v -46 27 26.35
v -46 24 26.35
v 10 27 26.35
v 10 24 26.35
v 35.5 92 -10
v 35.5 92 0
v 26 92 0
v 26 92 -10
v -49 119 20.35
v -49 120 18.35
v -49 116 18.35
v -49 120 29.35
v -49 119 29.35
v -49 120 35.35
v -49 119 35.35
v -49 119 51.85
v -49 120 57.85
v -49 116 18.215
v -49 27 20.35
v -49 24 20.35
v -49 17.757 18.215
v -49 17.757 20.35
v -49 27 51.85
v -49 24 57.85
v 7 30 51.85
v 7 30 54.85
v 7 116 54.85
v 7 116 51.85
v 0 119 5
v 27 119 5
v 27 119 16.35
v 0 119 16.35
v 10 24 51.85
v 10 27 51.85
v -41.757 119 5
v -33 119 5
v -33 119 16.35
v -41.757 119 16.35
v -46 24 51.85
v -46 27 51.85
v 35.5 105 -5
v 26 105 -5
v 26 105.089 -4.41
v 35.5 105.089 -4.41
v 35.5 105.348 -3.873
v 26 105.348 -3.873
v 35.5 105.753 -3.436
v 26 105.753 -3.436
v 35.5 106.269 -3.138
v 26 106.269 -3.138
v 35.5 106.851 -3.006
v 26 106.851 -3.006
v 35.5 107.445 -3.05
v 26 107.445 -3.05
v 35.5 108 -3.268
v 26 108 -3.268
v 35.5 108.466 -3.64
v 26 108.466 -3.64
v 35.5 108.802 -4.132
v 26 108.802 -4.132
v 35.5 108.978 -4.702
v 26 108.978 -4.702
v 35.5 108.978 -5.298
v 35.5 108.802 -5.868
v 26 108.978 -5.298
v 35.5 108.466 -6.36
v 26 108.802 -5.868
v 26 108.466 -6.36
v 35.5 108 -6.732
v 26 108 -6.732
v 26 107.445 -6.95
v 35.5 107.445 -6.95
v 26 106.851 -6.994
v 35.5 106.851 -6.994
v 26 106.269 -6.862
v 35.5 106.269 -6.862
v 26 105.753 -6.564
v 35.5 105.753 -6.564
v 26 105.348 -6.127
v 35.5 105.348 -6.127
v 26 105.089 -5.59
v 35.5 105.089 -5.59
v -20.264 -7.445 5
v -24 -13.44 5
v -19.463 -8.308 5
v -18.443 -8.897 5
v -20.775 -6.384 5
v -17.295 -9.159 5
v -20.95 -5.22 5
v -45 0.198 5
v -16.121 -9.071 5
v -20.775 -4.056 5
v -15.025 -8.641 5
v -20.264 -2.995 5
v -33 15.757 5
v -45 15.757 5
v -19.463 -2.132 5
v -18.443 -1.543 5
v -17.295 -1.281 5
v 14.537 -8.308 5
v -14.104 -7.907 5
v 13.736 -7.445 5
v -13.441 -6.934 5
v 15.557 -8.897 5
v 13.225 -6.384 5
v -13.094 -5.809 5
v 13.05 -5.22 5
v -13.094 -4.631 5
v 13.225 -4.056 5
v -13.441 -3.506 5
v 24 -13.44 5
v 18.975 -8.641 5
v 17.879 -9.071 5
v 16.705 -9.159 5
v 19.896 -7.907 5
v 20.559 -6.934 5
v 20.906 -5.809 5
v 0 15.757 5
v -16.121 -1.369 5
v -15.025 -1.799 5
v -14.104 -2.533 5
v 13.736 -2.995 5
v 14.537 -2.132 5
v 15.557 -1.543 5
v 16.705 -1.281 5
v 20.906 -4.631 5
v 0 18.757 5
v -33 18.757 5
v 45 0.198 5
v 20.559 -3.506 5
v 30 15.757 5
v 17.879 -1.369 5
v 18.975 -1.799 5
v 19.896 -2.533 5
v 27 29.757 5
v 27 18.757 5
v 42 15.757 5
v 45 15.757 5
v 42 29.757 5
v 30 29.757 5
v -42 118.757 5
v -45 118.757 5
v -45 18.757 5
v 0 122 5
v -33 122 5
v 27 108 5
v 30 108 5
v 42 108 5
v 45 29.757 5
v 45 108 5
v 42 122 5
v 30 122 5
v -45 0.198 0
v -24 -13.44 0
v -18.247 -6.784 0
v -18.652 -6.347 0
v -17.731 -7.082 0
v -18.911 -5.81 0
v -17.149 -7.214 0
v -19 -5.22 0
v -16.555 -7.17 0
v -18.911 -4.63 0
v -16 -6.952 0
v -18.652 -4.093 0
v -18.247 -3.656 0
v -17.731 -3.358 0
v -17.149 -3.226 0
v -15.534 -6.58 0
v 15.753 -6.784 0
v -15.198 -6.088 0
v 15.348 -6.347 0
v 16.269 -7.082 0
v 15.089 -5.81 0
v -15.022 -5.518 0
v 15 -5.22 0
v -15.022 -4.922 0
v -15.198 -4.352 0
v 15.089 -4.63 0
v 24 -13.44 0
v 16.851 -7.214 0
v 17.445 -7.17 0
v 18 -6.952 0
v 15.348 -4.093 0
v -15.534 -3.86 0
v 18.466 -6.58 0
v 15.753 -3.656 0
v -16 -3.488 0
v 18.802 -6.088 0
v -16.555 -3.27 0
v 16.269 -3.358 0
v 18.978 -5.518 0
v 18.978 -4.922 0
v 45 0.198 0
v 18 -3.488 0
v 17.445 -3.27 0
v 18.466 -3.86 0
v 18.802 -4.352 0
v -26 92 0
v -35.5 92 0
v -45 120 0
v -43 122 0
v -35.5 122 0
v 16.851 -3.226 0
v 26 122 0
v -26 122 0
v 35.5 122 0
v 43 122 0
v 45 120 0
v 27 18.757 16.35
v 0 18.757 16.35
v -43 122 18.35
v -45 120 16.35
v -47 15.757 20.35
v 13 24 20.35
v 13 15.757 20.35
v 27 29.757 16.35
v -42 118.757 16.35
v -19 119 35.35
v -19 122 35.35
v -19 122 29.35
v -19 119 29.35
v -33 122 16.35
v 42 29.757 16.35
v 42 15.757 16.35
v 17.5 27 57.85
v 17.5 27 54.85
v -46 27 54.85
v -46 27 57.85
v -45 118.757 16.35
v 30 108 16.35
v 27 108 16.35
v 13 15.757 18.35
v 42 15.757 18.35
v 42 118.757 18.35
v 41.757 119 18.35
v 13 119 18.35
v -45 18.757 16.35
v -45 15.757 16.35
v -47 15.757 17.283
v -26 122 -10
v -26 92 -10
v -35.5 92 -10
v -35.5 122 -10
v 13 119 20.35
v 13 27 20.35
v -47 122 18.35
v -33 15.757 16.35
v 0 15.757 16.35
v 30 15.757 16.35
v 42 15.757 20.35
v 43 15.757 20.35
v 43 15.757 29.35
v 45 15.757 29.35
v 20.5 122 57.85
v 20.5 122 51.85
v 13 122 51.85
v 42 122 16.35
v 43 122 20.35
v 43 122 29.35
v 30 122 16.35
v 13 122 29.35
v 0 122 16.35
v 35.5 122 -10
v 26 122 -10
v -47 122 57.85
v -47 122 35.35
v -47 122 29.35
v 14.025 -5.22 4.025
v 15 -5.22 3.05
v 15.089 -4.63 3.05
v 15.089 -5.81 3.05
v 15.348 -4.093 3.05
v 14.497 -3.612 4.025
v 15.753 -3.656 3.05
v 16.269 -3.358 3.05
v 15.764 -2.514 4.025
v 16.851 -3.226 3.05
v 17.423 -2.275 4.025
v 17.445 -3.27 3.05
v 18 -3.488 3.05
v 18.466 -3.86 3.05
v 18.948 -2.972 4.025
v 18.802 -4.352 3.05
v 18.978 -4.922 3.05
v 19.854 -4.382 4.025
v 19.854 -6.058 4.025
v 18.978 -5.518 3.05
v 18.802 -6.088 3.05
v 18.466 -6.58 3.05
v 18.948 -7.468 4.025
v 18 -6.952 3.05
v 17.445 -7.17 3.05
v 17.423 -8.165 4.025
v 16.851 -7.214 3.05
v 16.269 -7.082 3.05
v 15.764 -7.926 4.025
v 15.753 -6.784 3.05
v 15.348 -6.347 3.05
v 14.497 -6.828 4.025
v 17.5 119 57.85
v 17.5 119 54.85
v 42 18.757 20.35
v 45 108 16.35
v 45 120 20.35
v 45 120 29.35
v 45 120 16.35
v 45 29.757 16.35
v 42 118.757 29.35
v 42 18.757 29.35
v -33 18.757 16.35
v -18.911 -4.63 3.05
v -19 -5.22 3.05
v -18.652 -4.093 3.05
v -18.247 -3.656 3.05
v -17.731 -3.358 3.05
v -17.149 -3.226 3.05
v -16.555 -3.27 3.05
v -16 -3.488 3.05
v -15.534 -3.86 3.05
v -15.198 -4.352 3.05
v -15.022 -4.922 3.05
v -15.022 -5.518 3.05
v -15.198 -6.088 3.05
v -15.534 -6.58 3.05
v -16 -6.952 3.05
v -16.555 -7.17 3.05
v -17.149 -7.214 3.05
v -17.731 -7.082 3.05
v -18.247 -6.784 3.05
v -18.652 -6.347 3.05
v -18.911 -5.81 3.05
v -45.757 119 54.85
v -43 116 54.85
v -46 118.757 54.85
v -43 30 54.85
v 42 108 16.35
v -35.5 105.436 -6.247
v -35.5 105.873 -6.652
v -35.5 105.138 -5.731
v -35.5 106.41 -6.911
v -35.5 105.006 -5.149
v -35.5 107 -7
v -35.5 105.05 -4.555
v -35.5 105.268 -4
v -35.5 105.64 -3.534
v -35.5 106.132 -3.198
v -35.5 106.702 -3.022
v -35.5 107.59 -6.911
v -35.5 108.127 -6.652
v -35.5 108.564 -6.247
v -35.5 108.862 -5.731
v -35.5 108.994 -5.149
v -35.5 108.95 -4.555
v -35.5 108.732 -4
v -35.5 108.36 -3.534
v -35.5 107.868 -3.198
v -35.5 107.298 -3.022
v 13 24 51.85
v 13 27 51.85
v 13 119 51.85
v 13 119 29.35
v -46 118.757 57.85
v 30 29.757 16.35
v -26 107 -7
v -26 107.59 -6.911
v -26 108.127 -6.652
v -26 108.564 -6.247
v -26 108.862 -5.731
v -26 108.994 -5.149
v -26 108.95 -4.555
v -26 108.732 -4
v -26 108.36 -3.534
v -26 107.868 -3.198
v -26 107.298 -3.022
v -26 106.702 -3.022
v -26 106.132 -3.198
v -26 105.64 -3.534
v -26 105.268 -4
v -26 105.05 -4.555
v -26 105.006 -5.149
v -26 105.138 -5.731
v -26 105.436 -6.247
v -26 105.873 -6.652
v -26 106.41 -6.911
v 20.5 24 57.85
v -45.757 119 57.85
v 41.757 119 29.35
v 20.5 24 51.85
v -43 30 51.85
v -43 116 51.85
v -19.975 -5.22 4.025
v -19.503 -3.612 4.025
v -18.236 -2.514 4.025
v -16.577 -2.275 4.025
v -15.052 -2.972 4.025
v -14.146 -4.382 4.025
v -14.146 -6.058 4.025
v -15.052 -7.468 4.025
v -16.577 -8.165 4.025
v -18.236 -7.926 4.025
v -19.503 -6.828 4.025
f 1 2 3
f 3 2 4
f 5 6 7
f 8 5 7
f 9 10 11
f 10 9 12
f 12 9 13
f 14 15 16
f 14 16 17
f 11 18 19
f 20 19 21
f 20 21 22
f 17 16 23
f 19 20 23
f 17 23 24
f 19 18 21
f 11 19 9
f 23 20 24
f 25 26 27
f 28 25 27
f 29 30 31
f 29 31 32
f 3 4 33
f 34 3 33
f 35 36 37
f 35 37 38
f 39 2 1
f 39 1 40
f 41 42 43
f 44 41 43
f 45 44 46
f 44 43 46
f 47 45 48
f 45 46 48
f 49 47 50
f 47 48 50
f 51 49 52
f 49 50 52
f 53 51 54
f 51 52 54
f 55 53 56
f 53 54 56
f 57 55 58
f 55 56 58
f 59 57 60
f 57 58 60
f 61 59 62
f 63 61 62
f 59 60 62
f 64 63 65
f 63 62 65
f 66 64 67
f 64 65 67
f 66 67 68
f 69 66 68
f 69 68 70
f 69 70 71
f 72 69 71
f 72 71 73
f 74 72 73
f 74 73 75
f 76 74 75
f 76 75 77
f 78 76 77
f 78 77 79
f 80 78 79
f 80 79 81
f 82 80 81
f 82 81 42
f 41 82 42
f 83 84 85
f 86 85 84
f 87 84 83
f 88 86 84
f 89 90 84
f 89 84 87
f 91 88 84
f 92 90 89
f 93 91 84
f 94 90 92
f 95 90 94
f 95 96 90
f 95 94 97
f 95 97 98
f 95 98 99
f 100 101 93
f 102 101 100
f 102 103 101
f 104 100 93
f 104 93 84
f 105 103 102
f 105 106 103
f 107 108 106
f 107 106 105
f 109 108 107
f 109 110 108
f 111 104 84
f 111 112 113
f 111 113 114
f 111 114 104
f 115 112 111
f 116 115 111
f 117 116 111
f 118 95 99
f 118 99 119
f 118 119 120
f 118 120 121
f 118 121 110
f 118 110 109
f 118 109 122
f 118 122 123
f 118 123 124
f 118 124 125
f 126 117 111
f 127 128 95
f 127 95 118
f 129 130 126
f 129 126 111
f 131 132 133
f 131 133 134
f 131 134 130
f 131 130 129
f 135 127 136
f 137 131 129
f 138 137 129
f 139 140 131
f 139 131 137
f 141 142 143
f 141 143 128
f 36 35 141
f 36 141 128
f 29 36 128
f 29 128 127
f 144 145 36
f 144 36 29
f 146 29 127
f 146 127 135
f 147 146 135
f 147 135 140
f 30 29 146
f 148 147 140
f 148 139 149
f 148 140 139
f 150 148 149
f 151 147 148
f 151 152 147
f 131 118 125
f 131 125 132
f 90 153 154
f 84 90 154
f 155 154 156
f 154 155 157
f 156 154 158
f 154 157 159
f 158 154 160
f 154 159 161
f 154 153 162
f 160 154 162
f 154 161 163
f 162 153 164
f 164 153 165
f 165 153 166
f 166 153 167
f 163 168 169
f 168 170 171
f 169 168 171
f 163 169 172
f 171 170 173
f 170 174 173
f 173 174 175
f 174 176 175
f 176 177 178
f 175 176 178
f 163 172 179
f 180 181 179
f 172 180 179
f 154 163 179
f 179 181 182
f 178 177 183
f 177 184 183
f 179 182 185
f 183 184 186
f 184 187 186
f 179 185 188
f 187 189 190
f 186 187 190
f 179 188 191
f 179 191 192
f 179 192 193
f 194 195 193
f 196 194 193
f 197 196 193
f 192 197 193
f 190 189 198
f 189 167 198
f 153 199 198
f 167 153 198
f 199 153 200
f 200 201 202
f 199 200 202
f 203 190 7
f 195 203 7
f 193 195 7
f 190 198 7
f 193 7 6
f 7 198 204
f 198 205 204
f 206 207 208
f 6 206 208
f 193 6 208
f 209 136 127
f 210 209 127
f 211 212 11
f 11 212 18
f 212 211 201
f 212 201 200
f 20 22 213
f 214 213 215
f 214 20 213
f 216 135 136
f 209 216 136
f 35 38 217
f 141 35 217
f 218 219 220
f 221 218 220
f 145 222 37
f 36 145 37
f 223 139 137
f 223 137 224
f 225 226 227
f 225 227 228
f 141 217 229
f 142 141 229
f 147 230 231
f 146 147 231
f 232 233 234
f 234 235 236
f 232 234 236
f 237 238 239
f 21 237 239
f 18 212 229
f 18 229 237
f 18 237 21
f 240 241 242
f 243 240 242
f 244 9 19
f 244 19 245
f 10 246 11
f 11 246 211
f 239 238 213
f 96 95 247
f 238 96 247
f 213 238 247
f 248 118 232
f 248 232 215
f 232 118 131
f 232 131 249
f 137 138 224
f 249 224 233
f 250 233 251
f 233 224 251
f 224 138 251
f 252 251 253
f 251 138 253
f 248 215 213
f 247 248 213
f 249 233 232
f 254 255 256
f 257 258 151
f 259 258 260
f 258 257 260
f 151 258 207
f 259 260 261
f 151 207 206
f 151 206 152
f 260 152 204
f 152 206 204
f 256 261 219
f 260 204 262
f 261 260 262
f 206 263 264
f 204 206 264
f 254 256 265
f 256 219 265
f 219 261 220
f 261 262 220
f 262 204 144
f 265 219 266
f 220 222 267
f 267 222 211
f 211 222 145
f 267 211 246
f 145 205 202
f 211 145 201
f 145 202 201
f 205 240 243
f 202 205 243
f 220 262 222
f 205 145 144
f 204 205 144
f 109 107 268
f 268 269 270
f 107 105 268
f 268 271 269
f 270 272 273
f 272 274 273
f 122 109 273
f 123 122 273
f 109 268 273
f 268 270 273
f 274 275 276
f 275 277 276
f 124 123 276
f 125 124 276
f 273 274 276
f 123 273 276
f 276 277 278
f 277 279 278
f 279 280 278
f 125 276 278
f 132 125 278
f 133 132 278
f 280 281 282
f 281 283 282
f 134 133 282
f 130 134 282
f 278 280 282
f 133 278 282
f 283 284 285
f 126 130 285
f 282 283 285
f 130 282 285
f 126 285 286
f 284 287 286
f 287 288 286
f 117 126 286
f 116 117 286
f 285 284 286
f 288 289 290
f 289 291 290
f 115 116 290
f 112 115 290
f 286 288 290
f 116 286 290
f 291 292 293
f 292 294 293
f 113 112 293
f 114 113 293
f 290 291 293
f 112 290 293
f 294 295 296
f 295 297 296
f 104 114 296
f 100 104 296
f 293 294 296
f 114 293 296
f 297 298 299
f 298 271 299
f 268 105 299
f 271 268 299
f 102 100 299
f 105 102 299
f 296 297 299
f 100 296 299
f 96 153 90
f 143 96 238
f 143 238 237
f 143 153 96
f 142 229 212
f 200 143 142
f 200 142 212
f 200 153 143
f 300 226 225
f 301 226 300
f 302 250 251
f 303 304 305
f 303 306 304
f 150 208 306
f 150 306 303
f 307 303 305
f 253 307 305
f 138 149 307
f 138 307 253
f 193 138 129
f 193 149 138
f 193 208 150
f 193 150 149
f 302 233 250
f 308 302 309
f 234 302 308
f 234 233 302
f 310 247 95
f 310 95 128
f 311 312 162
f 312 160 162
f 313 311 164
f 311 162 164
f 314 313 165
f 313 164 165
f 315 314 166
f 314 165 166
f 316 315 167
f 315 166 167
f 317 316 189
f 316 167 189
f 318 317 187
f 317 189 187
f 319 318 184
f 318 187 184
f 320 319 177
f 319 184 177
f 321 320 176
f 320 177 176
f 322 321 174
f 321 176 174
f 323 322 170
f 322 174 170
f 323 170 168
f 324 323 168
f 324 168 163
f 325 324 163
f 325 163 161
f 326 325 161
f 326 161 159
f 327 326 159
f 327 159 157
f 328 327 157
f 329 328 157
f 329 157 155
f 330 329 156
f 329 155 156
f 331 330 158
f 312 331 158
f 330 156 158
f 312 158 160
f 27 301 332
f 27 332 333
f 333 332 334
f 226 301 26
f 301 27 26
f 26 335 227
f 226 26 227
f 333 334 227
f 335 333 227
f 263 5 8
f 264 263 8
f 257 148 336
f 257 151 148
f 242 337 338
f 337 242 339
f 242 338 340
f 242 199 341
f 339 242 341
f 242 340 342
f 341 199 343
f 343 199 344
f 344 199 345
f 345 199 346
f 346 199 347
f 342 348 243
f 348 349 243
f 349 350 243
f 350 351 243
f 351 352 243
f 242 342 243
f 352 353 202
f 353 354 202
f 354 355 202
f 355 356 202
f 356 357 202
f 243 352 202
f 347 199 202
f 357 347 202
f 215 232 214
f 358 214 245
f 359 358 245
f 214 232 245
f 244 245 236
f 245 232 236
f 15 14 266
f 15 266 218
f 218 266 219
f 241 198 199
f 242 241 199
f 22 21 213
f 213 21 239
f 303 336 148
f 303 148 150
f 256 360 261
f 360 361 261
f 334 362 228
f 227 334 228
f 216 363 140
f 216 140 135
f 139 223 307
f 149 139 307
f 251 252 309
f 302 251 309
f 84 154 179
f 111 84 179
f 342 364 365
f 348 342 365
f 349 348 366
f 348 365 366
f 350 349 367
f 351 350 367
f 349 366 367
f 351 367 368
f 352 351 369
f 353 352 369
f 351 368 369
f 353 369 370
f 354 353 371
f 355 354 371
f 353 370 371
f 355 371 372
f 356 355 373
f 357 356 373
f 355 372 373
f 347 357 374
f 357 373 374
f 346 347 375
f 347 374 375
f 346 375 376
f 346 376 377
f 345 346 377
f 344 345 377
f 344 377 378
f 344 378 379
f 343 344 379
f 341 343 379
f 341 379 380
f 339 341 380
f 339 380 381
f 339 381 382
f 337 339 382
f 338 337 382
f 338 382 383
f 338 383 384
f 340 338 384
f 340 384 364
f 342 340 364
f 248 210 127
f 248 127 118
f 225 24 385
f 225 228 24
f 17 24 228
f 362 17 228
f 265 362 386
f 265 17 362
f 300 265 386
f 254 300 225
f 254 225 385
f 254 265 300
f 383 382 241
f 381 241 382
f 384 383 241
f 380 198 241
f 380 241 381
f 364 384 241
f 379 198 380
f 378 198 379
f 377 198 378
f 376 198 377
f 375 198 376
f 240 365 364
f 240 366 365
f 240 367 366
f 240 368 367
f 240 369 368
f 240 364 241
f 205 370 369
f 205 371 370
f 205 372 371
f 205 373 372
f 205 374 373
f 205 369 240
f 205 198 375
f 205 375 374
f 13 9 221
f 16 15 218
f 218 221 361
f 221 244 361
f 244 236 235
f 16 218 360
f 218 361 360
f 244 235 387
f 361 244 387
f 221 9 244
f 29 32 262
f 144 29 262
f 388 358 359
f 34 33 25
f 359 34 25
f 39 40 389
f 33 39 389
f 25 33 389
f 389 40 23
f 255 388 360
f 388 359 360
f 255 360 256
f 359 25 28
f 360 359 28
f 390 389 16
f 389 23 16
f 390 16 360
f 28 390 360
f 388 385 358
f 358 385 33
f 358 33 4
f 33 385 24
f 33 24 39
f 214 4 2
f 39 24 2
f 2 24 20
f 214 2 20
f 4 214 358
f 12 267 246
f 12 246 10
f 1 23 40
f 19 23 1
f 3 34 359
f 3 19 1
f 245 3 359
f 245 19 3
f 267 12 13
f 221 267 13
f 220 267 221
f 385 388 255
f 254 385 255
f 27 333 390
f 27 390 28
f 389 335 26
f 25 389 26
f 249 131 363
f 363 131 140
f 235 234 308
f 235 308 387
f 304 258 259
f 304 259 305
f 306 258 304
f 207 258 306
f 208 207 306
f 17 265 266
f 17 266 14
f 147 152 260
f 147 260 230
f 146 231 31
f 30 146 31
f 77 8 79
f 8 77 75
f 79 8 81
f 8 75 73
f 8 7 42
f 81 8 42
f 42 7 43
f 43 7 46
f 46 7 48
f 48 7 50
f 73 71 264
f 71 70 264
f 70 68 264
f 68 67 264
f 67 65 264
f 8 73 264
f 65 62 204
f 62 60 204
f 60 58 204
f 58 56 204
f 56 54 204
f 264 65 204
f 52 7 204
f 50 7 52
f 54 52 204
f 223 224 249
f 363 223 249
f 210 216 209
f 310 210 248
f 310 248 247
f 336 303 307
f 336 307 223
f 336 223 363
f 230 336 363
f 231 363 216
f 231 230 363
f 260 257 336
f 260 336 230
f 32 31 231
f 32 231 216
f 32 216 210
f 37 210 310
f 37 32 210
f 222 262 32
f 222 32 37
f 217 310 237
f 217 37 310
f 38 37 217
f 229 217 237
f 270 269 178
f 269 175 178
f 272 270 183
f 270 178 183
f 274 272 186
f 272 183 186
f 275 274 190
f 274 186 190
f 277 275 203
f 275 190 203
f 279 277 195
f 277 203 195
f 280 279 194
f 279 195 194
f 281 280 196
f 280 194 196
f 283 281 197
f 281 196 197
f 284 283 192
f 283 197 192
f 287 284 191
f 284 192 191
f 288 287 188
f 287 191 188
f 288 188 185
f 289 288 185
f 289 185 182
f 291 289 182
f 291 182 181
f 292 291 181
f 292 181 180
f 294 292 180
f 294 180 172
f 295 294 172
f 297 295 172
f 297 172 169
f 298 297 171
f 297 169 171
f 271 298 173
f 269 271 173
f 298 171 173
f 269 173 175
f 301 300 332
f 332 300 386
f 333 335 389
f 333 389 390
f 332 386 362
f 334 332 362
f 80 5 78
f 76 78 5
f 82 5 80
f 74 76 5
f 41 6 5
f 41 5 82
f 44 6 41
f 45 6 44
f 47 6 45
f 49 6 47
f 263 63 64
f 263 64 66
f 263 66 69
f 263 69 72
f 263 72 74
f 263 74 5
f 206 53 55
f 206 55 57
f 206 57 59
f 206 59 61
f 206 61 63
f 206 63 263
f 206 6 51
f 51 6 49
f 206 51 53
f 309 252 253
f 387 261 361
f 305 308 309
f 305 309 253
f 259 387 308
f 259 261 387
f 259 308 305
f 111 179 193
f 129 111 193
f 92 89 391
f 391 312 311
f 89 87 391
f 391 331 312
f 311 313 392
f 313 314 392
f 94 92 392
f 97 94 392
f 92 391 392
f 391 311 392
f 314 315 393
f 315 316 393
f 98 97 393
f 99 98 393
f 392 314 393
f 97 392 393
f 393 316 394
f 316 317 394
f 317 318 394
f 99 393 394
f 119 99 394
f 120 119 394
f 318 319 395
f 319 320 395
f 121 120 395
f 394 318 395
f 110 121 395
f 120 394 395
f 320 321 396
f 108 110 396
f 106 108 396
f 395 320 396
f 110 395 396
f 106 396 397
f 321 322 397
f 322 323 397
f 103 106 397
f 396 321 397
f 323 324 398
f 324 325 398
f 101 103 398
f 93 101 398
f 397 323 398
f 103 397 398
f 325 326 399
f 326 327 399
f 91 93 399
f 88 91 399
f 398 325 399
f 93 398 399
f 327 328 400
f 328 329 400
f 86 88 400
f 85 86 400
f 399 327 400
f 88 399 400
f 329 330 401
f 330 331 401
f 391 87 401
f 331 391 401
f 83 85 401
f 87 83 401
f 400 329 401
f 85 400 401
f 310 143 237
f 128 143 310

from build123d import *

# Parameters (mm, degrees)
BOSS_EXTRUDE1_DEPTH           = 5
CHAMFER1_SIZE                 = 2
SKETCH4_W                     = 12
SKETCH4_H                     = 3
BOSS_EXTRUDE2_DEPTH           = 11.35
BOSS_EXTRUDE3_DEPTH           = 4
BOSS_EXTRUDE4_DEPTH           = 11.35
CHAMFER2_START                = 116.672618896
CHAMFER2_OUTLINE_W            = 5
CHAMFER2_OUTLINE_H            = 5.65
CHAMFER2_DEPTH                = 2.327381104
CUT_EXTRUDE2_DEPTH            = 2
BOSS_EXTRUDE5_DEPTH           = 9
BOSS_EXTRUDE6_DEPTH           = 12
SKETCH11_W                    = 3
SKETCH11_H                    = 100.242640687
BOSS_EXTRUDE7_DEPTH           = 9
CHAMFER3_SIZE                 = 2
SKETCH12_W                    = 21
SKETCH12_H                    = 5
CUT_EXTRUDE3_DEPTH            = 9
CHAMFER5_SIZE                 = 4.996701125
CHAMFER5_SIZE_2               = 2.33
SKETCH13_W                    = 12
SKETCH13_H                    = 11.35
CUT_EXTRUDE4_DEPTH            = 117
SKETCH14_W                    = 3
SKETCH14_H                    = 11.35
BOSS_EXTRUDE8_DEPTH           = 7
BOSS_EXTRUDE9_START           = 85.242641
SKETCH14_2_W                  = 3
SKETCH14_2_H                  = 11.35
BOSS_EXTRUDE9_DEPTH           = 8
SKETCH15_W                    = 9
SKETCH15_H                    = 92
CUT_EXTRUDE5_DEPTH            = 10
BOSS_EXTRUDE10_START          = -9
SKETCH16_W                    = 62
SKETCH16_H                    = 3
BOSS_EXTRUDE10_DEPTH          = 31.5
BOSS_EXTRUDE12_DEPTH          = 6
SKETCH18_W                    = 50
SKETCH18_H                    = 86
CUT_EXTRUDE6_DEPTH            = 6
CUT_EXTRUDE7_DEPTH            = 3
SKETCH20_W                    = 6
SKETCH20_H                    = 98
CUT_EXTRUDE8_DEPTH            = 3
BOSS_EXTRUDE13_DEPTH          = 10.5
SKETCH22_W                    = 3
SKETCH22_H                    = 92
BOSS_EXTRUDE14_DEPTH          = 3
CUT_EXTRUDE9_START            = -2
CUT_EXTRUDE9_DEPTH            = 10
CUT_EXTRUDE10_DEPTH           = 9
SKETCH25_W                    = 9.5
SKETCH25_H                    = 30
BOSS_EXTRUDE15_DEPTH          = 10
CSK_FOR_M4_SFHCS2_D           = 4
CSK_FOR_M4_SFHCS2_DEPTH       = 13
CSK_FOR_M4_SFHCS2_CSINK_D     = 7.9
CSK_FOR_M4_SFHCS2_CSINK_ANGLE = 90
CSK_FOR_M4_SFHCS2_TIP         = 1.201721238
CHAMFER6_SIZE                 = 2
CHAMFER6_SIZE_2               = 4.289013841
SKETCH30_W                    = 56
SKETCH30_H                    = 25.5
CUT_EXTRUDE11_DEPTH           = 18.5
SKETCH32_W                    = 30
SKETCH32_H                    = 6
CUT_EXTRUDE13_DEPTH           = 10
CSK_FOR_M4_SFHCS3_D           = 4
CSK_FOR_M4_SFHCS3_DEPTH       = 19
CSK_FOR_M4_SFHCS3_CSINK_D     = 7.9
CSK_FOR_M4_SFHCS3_CSINK_ANGLE = 90
CSK_FOR_M4_SFHCS3_TIP         = 1.201721238
F_4_0MM_DOWEL_HOLE1_D         = 4


with BuildPart() as part:
    # Sketch2 → Boss-Extrude1 (new body)
    with BuildSketch(Plane.XY):
        Polygon((-45, 122), (-45, 0.197559457), (-24, -13.44), (24, -13.44), (45, 0.197559457), (45, 122), align=None)
    extrude(amount=BOSS_EXTRUDE1_DEPTH)

    # Chamfer1
    chamfer1_edges = [part.edges().sort_by_distance(p)[0] for p in [
        (45, 122, 2.5),
        (-45, 122, 2.5),
    ]]
    chamfer(chamfer1_edges, length=CHAMFER1_SIZE)

    # Sketch4 → Boss-Extrude2 (add)
    with BuildSketch(Plane.XY.offset(5)):
        Polygon((-45, 120), (-43, 122), (-33, 122), (-33, 119), (-41.757359313, 119), (-42, 118.757359313), (-45, 118.757359313), align=None)
        with Locations((-39, 17.257359313)):
            Rectangle(SKETCH4_W, SKETCH4_H)
        Polygon((0, 122), (30, 122), (30, 108), (27, 108), (27, 119), (0, 119), align=None)
        Polygon((0, 15.757359313), (30, 15.757359313), (30, 29.757359313), (27, 29.757359313), (27, 18.757359313), (0, 18.757359313), align=None)
    extrude(amount=BOSS_EXTRUDE2_DEPTH)

    # Sketch5 → Boss-Extrude3 (add)
    with BuildSketch(Plane.XY.offset(16.35)):
        Polygon((45, 15.757359313), (-45, 15.757359313), (-45, 120), (-43, 122), (45, 122), align=None)
    extrude(amount=BOSS_EXTRUDE3_DEPTH)

    # Sketch6 → Boss-Extrude4 (add)
    with BuildSketch(Plane.XY.offset(5)):
        Polygon((38, 122), (43, 122), (45, 120), (45, 115), (42, 115), (42, 118.757359313), (41.757359313, 119), (38, 119), align=None)
        Polygon((45, 15.757359313), (39, 15.757359313), (39, 18.757359313), (42, 18.757359313), (42, 21.757359313), (45, 21.757359313), align=None)
    extrude(amount=BOSS_EXTRUDE4_DEPTH)

    # Chamfer2: read off the stored shape, not the designer's step
    # Chamfer2 outline → Chamfer2 (cut)
    with BuildSketch(Plane(origin=(0, 0, 0), x_dir=(0.7071067811865474, -0.7071067811865477, 0), z_dir=(0.7071067811865476, 0.7071067811865476, 0)).offset(CHAMFER2_START)):
        with Locations((-54.5, -19.175)):
            Rectangle(CHAMFER2_OUTLINE_W, CHAMFER2_OUTLINE_H)
    extrude(amount=CHAMFER2_DEPTH, mode=Mode.SUBTRACT)

    # Sketch8 → Cut-Extrude2 (cut)
    with BuildSketch(Plane.XY.offset(20.35)):
        Polygon((-45, 15.757359313), (-37, 15.757359313), (-37, 122), (-43, 122), (-45, 120), align=None)
    extrude(amount=-CUT_EXTRUDE2_DEPTH, mode=Mode.SUBTRACT)

    # Sketch9 → Boss-Extrude5 (add)
    with BuildSketch(Plane.XY.offset(20.35)):
        Polygon((-37, 18.757359313), (42, 18.757359313), (42, 118.757359313), (41.757359313, 119), (-37, 119), (-37, 122), (43, 122), (45, 120), (45, 15.757359313), (-37, 15.757359313), align=None)
    extrude(amount=BOSS_EXTRUDE5_DEPTH)

    # Sketch10 → Boss-Extrude6 (add)
    with BuildSketch(Plane.ZY.offset(37)):
        Polygon((18.35, 15.757359313), (29.35, 15.757359313), (29.35, 18.757359313), (20.35, 18.757359313), (20.35, 119), (29.35, 119), (29.35, 122), (18.35, 122), align=None)
    extrude(amount=BOSS_EXTRUDE6_DEPTH)

    # Sketch11 → Boss-Extrude7 (add)
    with BuildSketch(Plane.XY.offset(20.35)):
        with Locations((-47.5, 68.878679657)):
            Rectangle(SKETCH11_W, SKETCH11_H)
    extrude(amount=BOSS_EXTRUDE7_DEPTH)

    # Chamfer3
    chamfer3_edges = [part.edges().sort_by_distance(p)[0] for p in [
        (-49, 15.757359313, 23.85),
        (-49, 122, 23.85),
    ]]
    chamfer(chamfer3_edges, length=CHAMFER3_SIZE)

    # Sketch12 → Cut-Extrude3 (cut)
    with BuildSketch(Plane(origin=(0, 18.757359313, 0), x_dir=(1, 0, 0), z_dir=(0, 1, 0))):
        with Locations((27.5, -22.85)):
            Rectangle(SKETCH12_W, SKETCH12_H)
    extrude(amount=-CUT_EXTRUDE3_DEPTH, mode=Mode.SUBTRACT)

    # Chamfer5
    # the kernel refuses this chamfer: 4.996701125, 2.33 mm, written as the material it takes off along each edge
    with BuildSketch(Plane(origin=(38, 18.757359313, 20.35), x_dir=(1, 0, 0), z_dir=(0, 0, 1))) as chamfer5_piece_1_section:
        Polygon((CHAMFER5_SIZE, 0), (0, -CHAMFER5_SIZE_2), (0, 0), align=None)
    chamfer5_piece_1 = extrude(amount=5, mode=Mode.PRIVATE)
    chamfer5_piece_1 = split(chamfer5_piece_1, bisect_by=Plane(origin=(42, 18.757359313, 20.35), z_dir=(-1, 0, 0)), keep=Keep.TOP, mode=Mode.PRIVATE)
    add(chamfer5_piece_1, mode=Mode.SUBTRACT)
    with BuildSketch(Plane(origin=(17, 18.757359313, 25.35), x_dir=(-1, 0, 0), z_dir=(0, 0, -1))) as chamfer5_piece_2:
        Polygon((CHAMFER5_SIZE, 0), (0, -CHAMFER5_SIZE_2), (0, 0), align=None)
    extrude(amount=5, mode=Mode.SUBTRACT)

    # Sketch13 → Cut-Extrude4 (cut)
    with BuildSketch(Plane(origin=(0, 122, 0), x_dir=(1, 0, 0), z_dir=(0, 1, 0))):
        with Locations((36, -10.675)):
            Rectangle(SKETCH13_W, SKETCH13_H)
    extrude(amount=-CUT_EXTRUDE4_DEPTH, mode=Mode.SUBTRACT)

    # Sketch14 → Boss-Extrude8 (add)
    with BuildSketch(Plane.XZ.offset(-115)):
        with Locations((43.5, 10.675)):
            Rectangle(SKETCH14_W, SKETCH14_H)
    extrude(amount=BOSS_EXTRUDE8_DEPTH)

    # Sketch14<2> → Boss-Extrude9 (add)
    with BuildSketch(Plane.XZ.offset(-115).offset(BOSS_EXTRUDE9_START)):
        with Locations((43.5, 10.675)):
            Rectangle(SKETCH14_2_W, SKETCH14_2_H)
    extrude(amount=BOSS_EXTRUDE9_DEPTH)

    # Sketch15 → Cut-Extrude5 (cut)
    with BuildSketch(Plane.ZY.offset(49)):
        with Locations((24.85, 73)):
            Rectangle(SKETCH15_W, SKETCH15_H)
    extrude(amount=-CUT_EXTRUDE5_DEPTH, mode=Mode.SUBTRACT)

    # Sketch16 → Boss-Extrude10 (add)
    with BuildSketch(Plane.XY.offset(29.35).offset(BOSS_EXTRUDE10_START)):
        Polygon((13, 122), (13, 119), (-49, 119), (-49, 120), (-47, 122), align=None)
        with Locations((-18, 25.5)):
            Rectangle(SKETCH16_W, SKETCH16_H)
    extrude(amount=BOSS_EXTRUDE10_DEPTH)

    # Sketch17 → Boss-Extrude12 (add)
    with BuildSketch(Plane.XY.offset(51.85)):
        Polygon((-49, 119), (-49, 27), (-49, 24), (13, 24), (13, 27), (13, 119), (13, 122), (-47, 122), (-49, 120), align=None)
    extrude(amount=BOSS_EXTRUDE12_DEPTH)

    # Sketch18 → Cut-Extrude6 (cut)
    with BuildSketch(Plane.XY.offset(57.85)):
        with Locations((-18, 73)):
            Rectangle(SKETCH18_W, SKETCH18_H)
    extrude(amount=-CUT_EXTRUDE6_DEPTH, mode=Mode.SUBTRACT)

    # Sketch19 → Cut-Extrude7 (cut)
    with BuildSketch(Plane.XY.offset(57.85)):
        Polygon((10, 119), (-45.757359313, 119), (-46, 118.757359313), (-46, 27), (10, 27), align=None)
    extrude(amount=-CUT_EXTRUDE7_DEPTH, mode=Mode.SUBTRACT)

    # Sketch20 → Cut-Extrude8 (cut)
    with BuildSketch(Plane(origin=(13, 0, 0), x_dir=(0, 0, -1), z_dir=(1, 0, 0))):
        with Locations((-54.85, 73)):
            Rectangle(SKETCH20_W, SKETCH20_H)
    extrude(amount=-CUT_EXTRUDE8_DEPTH, mode=Mode.SUBTRACT)

    # Sketch21 → Boss-Extrude13 (add)
    with BuildSketch(Plane(origin=(10, 0, 0), x_dir=(0, 0, -1), z_dir=(1, 0, 0))):
        Polygon((-57.85, 27), (-57.85, 24), (-51.85, 24), (-51.85, 27), (-51.85, 119), (-51.85, 122), (-57.85, 122), (-57.85, 119), (-54.85, 119), (-54.85, 27), align=None)
    extrude(amount=BOSS_EXTRUDE13_DEPTH)

    # Sketch22 → Boss-Extrude14 (add)
    with BuildSketch(Plane.XY.offset(54.85)):
        with Locations((19, 73)):
            Rectangle(SKETCH22_W, SKETCH22_H)
    extrude(amount=BOSS_EXTRUDE14_DEPTH)

    # Sketch23 → Cut-Extrude9 (cut)
    with BuildSketch(Plane.XY.offset(20.35).offset(CUT_EXTRUDE9_START)):
        Polygon((13, 15.757359313), (13, 119), (41.757359313, 119), (42, 118.757359313), (42, 15.757359313), align=None)
    extrude(amount=CUT_EXTRUDE9_DEPTH, mode=Mode.SUBTRACT)

    # Sketch24 → Cut-Extrude10 (cut)
    with BuildSketch(Plane.XY.offset(29.35)):
        Polygon((43, 15.757359313), (42, 18.757359313), (-46, 18.757359313), (-46, 24), (-49, 24), (-49, 17.757359313), (-47, 15.757359313), align=None)
    extrude(amount=-CUT_EXTRUDE10_DEPTH, mode=Mode.SUBTRACT)

    # Sketch25 → Boss-Extrude15 (add)
    with BuildSketch(Plane(origin=(0, 0, 0), x_dir=(-1, 0, 0), z_dir=(0, 0, -1))):
        with Locations((30.75, 107)):
            Rectangle(SKETCH25_W, SKETCH25_H)
        with Locations((-30.75, 107)):
            Rectangle(SKETCH25_W, SKETCH25_H)
    extrude(amount=BOSS_EXTRUDE15_DEPTH)

    # CSK for M4 SFHCS2
    with Locations(Plane(origin=(-695.683007616, 1385.247292614, 5), x_dir=(1, 0, 0), z_dir=(0, 0, 1))):
        with Locations((678.683007616, -1390.467292614), (712.683007616, -1390.467292614)):
            CounterSinkHole(CSK_FOR_M4_SFHCS2_D / 2, CSK_FOR_M4_SFHCS2_CSINK_D / 2, depth=CSK_FOR_M4_SFHCS2_DEPTH, counter_sink_angle=CSK_FOR_M4_SFHCS2_CSINK_ANGLE)
            with Locations((0, 0, -(CSK_FOR_M4_SFHCS2_DEPTH + CSK_FOR_M4_SFHCS2_TIP / 2))):  # 118° drill point
                Cone(0, CSK_FOR_M4_SFHCS2_D / 2, CSK_FOR_M4_SFHCS2_TIP, mode=Mode.SUBTRACT)

    # Chamfer6
    # the kernel refuses this chamfer: 4.289013841, 2 mm, written as the material it adds along each edge
    with BuildSketch(Plane(origin=(-45, 131.112729659, 18.35), x_dir=(0, 0, -1), z_dir=(0, -1, 0))) as chamfer6_piece_1_section:
        Polygon((CHAMFER6_SIZE, 0), (0, -CHAMFER6_SIZE_2), (0, 0), align=None)
    chamfer6_piece_1 = extrude(amount=115.355370346, mode=Mode.PRIVATE)
    chamfer6_piece_1 = split(chamfer6_piece_1, bisect_by=Plane(origin=(-49, 131.112729659, 18.35), z_dir=(1, 0, 0)), keep=Keep.TOP, mode=Mode.PRIVATE)
    chamfer6_piece_1 = split(chamfer6_piece_1, bisect_by=Plane(origin=(-39.443635171, 125.556364829, 18.35), z_dir=(0.7071067811865476, -0.7071067811865476, 0)), keep=Keep.TOP, mode=Mode.PRIVATE)
    chamfer6_piece_1 = split(chamfer6_piece_1, bisect_by=Plane(origin=(-103.677685173, 72.435044486, 18.35), z_dir=(0.7071067811865476, 0.7071067811865476, 0)), keep=Keep.TOP, mode=Mode.PRIVATE)
    add(chamfer6_piece_1)

    # Sketch30 → Cut-Extrude11 (cut)
    with BuildSketch(Plane(origin=(-695.683007616, 24, -941.083024415), x_dir=(1, 0, 0), z_dir=(0, -1, 0))):
        with Locations((677.683007616, 980.183024415)):
            Rectangle(SKETCH30_W, SKETCH30_H)
    extrude(amount=-CUT_EXTRUDE11_DEPTH, mode=Mode.SUBTRACT)

    # Sketch32 → Cut-Extrude13 (cut)
    with BuildSketch(Plane(origin=(0, 122, 0), x_dir=(1, 0, 0), z_dir=(0, 1, 0))):
        with Locations((-34, -32.35)):
            Rectangle(SKETCH32_W, SKETCH32_H)
    extrude(amount=-CUT_EXTRUDE13_DEPTH, mode=Mode.SUBTRACT)

    # CSK for M4 SFHCS3
    with Locations(Plane(origin=(45, 1385.247292614, -941.083024415), x_dir=(0, 1, 0), z_dir=(1, 0, 0))):
        with Locations((-1278.247292614, 936.083024415)):
            CounterSinkHole(CSK_FOR_M4_SFHCS3_D / 2, CSK_FOR_M4_SFHCS3_CSINK_D / 2, depth=CSK_FOR_M4_SFHCS3_DEPTH, counter_sink_angle=CSK_FOR_M4_SFHCS3_CSINK_ANGLE)
            with Locations((0, 0, -(CSK_FOR_M4_SFHCS3_DEPTH + CSK_FOR_M4_SFHCS3_TIP / 2))):  # 118° drill point
                Cone(0, CSK_FOR_M4_SFHCS3_D / 2, CSK_FOR_M4_SFHCS3_TIP, mode=Mode.SUBTRACT)

    # Ø4.0mm Dowel Hole1 (through all)
    with Locations(Plane.ZY.offset(35.5)):
        with Locations((-5, 107)):
            Hole(F_4_0MM_DOWEL_HOLE1_D / 2)


solid = part.part
